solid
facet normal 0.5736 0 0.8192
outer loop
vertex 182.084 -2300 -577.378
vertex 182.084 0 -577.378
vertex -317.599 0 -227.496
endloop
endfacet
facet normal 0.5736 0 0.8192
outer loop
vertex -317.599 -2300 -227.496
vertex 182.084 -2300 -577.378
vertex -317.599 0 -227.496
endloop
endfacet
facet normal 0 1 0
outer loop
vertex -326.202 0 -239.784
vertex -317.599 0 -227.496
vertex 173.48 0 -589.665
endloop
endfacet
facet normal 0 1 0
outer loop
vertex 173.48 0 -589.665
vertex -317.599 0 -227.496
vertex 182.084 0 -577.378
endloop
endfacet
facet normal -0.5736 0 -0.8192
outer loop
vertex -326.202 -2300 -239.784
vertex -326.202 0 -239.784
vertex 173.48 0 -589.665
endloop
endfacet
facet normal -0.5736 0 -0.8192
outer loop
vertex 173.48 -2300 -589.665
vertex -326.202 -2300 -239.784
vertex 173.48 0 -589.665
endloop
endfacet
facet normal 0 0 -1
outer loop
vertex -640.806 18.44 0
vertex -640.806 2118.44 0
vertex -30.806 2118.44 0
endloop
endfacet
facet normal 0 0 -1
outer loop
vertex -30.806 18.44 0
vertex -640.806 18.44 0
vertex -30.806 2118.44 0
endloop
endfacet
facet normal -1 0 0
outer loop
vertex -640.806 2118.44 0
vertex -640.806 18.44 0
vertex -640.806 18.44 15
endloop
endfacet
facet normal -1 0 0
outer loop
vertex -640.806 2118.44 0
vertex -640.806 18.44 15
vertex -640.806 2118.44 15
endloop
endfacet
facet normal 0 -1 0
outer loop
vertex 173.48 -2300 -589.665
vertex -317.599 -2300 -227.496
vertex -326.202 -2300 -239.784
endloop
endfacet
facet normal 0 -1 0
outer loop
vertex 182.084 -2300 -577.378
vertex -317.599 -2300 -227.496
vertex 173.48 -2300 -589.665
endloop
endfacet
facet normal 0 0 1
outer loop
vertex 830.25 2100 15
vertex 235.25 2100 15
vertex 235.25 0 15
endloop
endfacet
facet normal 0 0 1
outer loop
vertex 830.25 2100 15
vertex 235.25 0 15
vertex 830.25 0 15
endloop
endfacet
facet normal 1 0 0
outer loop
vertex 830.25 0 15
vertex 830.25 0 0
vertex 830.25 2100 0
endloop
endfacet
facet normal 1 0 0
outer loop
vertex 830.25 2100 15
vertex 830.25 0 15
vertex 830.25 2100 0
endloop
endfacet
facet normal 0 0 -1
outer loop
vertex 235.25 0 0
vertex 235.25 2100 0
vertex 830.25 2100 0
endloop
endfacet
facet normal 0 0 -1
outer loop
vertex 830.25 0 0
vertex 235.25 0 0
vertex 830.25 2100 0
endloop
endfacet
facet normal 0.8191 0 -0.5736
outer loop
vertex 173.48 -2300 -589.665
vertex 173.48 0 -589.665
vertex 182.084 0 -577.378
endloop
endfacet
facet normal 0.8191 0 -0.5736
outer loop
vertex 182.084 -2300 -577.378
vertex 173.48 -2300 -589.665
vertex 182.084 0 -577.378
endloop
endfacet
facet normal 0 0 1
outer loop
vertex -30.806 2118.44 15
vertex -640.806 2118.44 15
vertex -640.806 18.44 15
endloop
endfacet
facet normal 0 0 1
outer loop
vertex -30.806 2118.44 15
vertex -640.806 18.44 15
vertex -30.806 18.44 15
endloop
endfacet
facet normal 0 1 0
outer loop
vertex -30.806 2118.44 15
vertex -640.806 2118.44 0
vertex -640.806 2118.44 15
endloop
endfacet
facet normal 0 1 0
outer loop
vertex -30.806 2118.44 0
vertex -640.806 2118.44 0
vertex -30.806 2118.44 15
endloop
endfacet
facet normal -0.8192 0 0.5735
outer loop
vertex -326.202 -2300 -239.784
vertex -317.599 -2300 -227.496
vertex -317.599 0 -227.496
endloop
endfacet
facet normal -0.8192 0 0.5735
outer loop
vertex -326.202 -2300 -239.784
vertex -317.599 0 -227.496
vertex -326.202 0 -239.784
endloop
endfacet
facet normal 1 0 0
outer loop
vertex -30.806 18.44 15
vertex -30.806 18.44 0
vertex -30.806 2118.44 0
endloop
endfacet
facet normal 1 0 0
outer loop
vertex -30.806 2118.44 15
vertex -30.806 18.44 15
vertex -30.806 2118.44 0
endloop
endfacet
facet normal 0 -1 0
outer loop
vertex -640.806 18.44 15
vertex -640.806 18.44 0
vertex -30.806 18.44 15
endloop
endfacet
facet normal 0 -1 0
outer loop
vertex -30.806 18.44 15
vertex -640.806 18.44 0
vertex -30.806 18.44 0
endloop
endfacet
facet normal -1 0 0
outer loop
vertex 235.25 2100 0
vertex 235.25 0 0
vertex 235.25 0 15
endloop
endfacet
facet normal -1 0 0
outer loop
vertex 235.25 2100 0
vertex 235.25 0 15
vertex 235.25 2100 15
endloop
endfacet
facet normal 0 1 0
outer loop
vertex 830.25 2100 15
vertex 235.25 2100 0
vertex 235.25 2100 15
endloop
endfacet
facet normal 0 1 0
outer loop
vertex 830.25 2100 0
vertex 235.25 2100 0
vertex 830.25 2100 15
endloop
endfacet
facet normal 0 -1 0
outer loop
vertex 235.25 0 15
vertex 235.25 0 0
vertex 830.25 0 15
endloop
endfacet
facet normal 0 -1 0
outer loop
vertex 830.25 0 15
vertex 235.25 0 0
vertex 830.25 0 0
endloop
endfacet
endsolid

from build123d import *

# Parameters (mm, degrees)
F0_W     = 610
F0_H     = 2100
F1_DEPTH = 15
F2_W     = 595
F2_H     = 2100
F3_DEPTH = 15
F5_DEPTH = 2300


with BuildPart() as f1:
    # F0 (on Top) → F1 (new body)
    with BuildSketch(Plane.XY):
        with Locations((-335.805787, 1068.440085)):
            Rectangle(F0_W, F0_H)
    extrude(amount=F1_DEPTH)


with BuildPart() as f3:
    # F2 (on Top) → F3 (new body)
    with BuildSketch(Plane.XY):
        with Locations((532.749718, 1050)):
            Rectangle(F2_W, F2_H)
    extrude(amount=F3_DEPTH)


with BuildPart() as f5:
    # F4 (on Front) → F5 (new body)
    with BuildSketch(Plane.XZ):
        Polygon((-326.202482, -239.783511), (173.480265, -589.665137), (182.083912, -577.377856), (-317.598835, -227.49623), align=None)
    extrude(amount=F5_DEPTH)


solid = Compound([f1.part, f3.part, f5.part])
